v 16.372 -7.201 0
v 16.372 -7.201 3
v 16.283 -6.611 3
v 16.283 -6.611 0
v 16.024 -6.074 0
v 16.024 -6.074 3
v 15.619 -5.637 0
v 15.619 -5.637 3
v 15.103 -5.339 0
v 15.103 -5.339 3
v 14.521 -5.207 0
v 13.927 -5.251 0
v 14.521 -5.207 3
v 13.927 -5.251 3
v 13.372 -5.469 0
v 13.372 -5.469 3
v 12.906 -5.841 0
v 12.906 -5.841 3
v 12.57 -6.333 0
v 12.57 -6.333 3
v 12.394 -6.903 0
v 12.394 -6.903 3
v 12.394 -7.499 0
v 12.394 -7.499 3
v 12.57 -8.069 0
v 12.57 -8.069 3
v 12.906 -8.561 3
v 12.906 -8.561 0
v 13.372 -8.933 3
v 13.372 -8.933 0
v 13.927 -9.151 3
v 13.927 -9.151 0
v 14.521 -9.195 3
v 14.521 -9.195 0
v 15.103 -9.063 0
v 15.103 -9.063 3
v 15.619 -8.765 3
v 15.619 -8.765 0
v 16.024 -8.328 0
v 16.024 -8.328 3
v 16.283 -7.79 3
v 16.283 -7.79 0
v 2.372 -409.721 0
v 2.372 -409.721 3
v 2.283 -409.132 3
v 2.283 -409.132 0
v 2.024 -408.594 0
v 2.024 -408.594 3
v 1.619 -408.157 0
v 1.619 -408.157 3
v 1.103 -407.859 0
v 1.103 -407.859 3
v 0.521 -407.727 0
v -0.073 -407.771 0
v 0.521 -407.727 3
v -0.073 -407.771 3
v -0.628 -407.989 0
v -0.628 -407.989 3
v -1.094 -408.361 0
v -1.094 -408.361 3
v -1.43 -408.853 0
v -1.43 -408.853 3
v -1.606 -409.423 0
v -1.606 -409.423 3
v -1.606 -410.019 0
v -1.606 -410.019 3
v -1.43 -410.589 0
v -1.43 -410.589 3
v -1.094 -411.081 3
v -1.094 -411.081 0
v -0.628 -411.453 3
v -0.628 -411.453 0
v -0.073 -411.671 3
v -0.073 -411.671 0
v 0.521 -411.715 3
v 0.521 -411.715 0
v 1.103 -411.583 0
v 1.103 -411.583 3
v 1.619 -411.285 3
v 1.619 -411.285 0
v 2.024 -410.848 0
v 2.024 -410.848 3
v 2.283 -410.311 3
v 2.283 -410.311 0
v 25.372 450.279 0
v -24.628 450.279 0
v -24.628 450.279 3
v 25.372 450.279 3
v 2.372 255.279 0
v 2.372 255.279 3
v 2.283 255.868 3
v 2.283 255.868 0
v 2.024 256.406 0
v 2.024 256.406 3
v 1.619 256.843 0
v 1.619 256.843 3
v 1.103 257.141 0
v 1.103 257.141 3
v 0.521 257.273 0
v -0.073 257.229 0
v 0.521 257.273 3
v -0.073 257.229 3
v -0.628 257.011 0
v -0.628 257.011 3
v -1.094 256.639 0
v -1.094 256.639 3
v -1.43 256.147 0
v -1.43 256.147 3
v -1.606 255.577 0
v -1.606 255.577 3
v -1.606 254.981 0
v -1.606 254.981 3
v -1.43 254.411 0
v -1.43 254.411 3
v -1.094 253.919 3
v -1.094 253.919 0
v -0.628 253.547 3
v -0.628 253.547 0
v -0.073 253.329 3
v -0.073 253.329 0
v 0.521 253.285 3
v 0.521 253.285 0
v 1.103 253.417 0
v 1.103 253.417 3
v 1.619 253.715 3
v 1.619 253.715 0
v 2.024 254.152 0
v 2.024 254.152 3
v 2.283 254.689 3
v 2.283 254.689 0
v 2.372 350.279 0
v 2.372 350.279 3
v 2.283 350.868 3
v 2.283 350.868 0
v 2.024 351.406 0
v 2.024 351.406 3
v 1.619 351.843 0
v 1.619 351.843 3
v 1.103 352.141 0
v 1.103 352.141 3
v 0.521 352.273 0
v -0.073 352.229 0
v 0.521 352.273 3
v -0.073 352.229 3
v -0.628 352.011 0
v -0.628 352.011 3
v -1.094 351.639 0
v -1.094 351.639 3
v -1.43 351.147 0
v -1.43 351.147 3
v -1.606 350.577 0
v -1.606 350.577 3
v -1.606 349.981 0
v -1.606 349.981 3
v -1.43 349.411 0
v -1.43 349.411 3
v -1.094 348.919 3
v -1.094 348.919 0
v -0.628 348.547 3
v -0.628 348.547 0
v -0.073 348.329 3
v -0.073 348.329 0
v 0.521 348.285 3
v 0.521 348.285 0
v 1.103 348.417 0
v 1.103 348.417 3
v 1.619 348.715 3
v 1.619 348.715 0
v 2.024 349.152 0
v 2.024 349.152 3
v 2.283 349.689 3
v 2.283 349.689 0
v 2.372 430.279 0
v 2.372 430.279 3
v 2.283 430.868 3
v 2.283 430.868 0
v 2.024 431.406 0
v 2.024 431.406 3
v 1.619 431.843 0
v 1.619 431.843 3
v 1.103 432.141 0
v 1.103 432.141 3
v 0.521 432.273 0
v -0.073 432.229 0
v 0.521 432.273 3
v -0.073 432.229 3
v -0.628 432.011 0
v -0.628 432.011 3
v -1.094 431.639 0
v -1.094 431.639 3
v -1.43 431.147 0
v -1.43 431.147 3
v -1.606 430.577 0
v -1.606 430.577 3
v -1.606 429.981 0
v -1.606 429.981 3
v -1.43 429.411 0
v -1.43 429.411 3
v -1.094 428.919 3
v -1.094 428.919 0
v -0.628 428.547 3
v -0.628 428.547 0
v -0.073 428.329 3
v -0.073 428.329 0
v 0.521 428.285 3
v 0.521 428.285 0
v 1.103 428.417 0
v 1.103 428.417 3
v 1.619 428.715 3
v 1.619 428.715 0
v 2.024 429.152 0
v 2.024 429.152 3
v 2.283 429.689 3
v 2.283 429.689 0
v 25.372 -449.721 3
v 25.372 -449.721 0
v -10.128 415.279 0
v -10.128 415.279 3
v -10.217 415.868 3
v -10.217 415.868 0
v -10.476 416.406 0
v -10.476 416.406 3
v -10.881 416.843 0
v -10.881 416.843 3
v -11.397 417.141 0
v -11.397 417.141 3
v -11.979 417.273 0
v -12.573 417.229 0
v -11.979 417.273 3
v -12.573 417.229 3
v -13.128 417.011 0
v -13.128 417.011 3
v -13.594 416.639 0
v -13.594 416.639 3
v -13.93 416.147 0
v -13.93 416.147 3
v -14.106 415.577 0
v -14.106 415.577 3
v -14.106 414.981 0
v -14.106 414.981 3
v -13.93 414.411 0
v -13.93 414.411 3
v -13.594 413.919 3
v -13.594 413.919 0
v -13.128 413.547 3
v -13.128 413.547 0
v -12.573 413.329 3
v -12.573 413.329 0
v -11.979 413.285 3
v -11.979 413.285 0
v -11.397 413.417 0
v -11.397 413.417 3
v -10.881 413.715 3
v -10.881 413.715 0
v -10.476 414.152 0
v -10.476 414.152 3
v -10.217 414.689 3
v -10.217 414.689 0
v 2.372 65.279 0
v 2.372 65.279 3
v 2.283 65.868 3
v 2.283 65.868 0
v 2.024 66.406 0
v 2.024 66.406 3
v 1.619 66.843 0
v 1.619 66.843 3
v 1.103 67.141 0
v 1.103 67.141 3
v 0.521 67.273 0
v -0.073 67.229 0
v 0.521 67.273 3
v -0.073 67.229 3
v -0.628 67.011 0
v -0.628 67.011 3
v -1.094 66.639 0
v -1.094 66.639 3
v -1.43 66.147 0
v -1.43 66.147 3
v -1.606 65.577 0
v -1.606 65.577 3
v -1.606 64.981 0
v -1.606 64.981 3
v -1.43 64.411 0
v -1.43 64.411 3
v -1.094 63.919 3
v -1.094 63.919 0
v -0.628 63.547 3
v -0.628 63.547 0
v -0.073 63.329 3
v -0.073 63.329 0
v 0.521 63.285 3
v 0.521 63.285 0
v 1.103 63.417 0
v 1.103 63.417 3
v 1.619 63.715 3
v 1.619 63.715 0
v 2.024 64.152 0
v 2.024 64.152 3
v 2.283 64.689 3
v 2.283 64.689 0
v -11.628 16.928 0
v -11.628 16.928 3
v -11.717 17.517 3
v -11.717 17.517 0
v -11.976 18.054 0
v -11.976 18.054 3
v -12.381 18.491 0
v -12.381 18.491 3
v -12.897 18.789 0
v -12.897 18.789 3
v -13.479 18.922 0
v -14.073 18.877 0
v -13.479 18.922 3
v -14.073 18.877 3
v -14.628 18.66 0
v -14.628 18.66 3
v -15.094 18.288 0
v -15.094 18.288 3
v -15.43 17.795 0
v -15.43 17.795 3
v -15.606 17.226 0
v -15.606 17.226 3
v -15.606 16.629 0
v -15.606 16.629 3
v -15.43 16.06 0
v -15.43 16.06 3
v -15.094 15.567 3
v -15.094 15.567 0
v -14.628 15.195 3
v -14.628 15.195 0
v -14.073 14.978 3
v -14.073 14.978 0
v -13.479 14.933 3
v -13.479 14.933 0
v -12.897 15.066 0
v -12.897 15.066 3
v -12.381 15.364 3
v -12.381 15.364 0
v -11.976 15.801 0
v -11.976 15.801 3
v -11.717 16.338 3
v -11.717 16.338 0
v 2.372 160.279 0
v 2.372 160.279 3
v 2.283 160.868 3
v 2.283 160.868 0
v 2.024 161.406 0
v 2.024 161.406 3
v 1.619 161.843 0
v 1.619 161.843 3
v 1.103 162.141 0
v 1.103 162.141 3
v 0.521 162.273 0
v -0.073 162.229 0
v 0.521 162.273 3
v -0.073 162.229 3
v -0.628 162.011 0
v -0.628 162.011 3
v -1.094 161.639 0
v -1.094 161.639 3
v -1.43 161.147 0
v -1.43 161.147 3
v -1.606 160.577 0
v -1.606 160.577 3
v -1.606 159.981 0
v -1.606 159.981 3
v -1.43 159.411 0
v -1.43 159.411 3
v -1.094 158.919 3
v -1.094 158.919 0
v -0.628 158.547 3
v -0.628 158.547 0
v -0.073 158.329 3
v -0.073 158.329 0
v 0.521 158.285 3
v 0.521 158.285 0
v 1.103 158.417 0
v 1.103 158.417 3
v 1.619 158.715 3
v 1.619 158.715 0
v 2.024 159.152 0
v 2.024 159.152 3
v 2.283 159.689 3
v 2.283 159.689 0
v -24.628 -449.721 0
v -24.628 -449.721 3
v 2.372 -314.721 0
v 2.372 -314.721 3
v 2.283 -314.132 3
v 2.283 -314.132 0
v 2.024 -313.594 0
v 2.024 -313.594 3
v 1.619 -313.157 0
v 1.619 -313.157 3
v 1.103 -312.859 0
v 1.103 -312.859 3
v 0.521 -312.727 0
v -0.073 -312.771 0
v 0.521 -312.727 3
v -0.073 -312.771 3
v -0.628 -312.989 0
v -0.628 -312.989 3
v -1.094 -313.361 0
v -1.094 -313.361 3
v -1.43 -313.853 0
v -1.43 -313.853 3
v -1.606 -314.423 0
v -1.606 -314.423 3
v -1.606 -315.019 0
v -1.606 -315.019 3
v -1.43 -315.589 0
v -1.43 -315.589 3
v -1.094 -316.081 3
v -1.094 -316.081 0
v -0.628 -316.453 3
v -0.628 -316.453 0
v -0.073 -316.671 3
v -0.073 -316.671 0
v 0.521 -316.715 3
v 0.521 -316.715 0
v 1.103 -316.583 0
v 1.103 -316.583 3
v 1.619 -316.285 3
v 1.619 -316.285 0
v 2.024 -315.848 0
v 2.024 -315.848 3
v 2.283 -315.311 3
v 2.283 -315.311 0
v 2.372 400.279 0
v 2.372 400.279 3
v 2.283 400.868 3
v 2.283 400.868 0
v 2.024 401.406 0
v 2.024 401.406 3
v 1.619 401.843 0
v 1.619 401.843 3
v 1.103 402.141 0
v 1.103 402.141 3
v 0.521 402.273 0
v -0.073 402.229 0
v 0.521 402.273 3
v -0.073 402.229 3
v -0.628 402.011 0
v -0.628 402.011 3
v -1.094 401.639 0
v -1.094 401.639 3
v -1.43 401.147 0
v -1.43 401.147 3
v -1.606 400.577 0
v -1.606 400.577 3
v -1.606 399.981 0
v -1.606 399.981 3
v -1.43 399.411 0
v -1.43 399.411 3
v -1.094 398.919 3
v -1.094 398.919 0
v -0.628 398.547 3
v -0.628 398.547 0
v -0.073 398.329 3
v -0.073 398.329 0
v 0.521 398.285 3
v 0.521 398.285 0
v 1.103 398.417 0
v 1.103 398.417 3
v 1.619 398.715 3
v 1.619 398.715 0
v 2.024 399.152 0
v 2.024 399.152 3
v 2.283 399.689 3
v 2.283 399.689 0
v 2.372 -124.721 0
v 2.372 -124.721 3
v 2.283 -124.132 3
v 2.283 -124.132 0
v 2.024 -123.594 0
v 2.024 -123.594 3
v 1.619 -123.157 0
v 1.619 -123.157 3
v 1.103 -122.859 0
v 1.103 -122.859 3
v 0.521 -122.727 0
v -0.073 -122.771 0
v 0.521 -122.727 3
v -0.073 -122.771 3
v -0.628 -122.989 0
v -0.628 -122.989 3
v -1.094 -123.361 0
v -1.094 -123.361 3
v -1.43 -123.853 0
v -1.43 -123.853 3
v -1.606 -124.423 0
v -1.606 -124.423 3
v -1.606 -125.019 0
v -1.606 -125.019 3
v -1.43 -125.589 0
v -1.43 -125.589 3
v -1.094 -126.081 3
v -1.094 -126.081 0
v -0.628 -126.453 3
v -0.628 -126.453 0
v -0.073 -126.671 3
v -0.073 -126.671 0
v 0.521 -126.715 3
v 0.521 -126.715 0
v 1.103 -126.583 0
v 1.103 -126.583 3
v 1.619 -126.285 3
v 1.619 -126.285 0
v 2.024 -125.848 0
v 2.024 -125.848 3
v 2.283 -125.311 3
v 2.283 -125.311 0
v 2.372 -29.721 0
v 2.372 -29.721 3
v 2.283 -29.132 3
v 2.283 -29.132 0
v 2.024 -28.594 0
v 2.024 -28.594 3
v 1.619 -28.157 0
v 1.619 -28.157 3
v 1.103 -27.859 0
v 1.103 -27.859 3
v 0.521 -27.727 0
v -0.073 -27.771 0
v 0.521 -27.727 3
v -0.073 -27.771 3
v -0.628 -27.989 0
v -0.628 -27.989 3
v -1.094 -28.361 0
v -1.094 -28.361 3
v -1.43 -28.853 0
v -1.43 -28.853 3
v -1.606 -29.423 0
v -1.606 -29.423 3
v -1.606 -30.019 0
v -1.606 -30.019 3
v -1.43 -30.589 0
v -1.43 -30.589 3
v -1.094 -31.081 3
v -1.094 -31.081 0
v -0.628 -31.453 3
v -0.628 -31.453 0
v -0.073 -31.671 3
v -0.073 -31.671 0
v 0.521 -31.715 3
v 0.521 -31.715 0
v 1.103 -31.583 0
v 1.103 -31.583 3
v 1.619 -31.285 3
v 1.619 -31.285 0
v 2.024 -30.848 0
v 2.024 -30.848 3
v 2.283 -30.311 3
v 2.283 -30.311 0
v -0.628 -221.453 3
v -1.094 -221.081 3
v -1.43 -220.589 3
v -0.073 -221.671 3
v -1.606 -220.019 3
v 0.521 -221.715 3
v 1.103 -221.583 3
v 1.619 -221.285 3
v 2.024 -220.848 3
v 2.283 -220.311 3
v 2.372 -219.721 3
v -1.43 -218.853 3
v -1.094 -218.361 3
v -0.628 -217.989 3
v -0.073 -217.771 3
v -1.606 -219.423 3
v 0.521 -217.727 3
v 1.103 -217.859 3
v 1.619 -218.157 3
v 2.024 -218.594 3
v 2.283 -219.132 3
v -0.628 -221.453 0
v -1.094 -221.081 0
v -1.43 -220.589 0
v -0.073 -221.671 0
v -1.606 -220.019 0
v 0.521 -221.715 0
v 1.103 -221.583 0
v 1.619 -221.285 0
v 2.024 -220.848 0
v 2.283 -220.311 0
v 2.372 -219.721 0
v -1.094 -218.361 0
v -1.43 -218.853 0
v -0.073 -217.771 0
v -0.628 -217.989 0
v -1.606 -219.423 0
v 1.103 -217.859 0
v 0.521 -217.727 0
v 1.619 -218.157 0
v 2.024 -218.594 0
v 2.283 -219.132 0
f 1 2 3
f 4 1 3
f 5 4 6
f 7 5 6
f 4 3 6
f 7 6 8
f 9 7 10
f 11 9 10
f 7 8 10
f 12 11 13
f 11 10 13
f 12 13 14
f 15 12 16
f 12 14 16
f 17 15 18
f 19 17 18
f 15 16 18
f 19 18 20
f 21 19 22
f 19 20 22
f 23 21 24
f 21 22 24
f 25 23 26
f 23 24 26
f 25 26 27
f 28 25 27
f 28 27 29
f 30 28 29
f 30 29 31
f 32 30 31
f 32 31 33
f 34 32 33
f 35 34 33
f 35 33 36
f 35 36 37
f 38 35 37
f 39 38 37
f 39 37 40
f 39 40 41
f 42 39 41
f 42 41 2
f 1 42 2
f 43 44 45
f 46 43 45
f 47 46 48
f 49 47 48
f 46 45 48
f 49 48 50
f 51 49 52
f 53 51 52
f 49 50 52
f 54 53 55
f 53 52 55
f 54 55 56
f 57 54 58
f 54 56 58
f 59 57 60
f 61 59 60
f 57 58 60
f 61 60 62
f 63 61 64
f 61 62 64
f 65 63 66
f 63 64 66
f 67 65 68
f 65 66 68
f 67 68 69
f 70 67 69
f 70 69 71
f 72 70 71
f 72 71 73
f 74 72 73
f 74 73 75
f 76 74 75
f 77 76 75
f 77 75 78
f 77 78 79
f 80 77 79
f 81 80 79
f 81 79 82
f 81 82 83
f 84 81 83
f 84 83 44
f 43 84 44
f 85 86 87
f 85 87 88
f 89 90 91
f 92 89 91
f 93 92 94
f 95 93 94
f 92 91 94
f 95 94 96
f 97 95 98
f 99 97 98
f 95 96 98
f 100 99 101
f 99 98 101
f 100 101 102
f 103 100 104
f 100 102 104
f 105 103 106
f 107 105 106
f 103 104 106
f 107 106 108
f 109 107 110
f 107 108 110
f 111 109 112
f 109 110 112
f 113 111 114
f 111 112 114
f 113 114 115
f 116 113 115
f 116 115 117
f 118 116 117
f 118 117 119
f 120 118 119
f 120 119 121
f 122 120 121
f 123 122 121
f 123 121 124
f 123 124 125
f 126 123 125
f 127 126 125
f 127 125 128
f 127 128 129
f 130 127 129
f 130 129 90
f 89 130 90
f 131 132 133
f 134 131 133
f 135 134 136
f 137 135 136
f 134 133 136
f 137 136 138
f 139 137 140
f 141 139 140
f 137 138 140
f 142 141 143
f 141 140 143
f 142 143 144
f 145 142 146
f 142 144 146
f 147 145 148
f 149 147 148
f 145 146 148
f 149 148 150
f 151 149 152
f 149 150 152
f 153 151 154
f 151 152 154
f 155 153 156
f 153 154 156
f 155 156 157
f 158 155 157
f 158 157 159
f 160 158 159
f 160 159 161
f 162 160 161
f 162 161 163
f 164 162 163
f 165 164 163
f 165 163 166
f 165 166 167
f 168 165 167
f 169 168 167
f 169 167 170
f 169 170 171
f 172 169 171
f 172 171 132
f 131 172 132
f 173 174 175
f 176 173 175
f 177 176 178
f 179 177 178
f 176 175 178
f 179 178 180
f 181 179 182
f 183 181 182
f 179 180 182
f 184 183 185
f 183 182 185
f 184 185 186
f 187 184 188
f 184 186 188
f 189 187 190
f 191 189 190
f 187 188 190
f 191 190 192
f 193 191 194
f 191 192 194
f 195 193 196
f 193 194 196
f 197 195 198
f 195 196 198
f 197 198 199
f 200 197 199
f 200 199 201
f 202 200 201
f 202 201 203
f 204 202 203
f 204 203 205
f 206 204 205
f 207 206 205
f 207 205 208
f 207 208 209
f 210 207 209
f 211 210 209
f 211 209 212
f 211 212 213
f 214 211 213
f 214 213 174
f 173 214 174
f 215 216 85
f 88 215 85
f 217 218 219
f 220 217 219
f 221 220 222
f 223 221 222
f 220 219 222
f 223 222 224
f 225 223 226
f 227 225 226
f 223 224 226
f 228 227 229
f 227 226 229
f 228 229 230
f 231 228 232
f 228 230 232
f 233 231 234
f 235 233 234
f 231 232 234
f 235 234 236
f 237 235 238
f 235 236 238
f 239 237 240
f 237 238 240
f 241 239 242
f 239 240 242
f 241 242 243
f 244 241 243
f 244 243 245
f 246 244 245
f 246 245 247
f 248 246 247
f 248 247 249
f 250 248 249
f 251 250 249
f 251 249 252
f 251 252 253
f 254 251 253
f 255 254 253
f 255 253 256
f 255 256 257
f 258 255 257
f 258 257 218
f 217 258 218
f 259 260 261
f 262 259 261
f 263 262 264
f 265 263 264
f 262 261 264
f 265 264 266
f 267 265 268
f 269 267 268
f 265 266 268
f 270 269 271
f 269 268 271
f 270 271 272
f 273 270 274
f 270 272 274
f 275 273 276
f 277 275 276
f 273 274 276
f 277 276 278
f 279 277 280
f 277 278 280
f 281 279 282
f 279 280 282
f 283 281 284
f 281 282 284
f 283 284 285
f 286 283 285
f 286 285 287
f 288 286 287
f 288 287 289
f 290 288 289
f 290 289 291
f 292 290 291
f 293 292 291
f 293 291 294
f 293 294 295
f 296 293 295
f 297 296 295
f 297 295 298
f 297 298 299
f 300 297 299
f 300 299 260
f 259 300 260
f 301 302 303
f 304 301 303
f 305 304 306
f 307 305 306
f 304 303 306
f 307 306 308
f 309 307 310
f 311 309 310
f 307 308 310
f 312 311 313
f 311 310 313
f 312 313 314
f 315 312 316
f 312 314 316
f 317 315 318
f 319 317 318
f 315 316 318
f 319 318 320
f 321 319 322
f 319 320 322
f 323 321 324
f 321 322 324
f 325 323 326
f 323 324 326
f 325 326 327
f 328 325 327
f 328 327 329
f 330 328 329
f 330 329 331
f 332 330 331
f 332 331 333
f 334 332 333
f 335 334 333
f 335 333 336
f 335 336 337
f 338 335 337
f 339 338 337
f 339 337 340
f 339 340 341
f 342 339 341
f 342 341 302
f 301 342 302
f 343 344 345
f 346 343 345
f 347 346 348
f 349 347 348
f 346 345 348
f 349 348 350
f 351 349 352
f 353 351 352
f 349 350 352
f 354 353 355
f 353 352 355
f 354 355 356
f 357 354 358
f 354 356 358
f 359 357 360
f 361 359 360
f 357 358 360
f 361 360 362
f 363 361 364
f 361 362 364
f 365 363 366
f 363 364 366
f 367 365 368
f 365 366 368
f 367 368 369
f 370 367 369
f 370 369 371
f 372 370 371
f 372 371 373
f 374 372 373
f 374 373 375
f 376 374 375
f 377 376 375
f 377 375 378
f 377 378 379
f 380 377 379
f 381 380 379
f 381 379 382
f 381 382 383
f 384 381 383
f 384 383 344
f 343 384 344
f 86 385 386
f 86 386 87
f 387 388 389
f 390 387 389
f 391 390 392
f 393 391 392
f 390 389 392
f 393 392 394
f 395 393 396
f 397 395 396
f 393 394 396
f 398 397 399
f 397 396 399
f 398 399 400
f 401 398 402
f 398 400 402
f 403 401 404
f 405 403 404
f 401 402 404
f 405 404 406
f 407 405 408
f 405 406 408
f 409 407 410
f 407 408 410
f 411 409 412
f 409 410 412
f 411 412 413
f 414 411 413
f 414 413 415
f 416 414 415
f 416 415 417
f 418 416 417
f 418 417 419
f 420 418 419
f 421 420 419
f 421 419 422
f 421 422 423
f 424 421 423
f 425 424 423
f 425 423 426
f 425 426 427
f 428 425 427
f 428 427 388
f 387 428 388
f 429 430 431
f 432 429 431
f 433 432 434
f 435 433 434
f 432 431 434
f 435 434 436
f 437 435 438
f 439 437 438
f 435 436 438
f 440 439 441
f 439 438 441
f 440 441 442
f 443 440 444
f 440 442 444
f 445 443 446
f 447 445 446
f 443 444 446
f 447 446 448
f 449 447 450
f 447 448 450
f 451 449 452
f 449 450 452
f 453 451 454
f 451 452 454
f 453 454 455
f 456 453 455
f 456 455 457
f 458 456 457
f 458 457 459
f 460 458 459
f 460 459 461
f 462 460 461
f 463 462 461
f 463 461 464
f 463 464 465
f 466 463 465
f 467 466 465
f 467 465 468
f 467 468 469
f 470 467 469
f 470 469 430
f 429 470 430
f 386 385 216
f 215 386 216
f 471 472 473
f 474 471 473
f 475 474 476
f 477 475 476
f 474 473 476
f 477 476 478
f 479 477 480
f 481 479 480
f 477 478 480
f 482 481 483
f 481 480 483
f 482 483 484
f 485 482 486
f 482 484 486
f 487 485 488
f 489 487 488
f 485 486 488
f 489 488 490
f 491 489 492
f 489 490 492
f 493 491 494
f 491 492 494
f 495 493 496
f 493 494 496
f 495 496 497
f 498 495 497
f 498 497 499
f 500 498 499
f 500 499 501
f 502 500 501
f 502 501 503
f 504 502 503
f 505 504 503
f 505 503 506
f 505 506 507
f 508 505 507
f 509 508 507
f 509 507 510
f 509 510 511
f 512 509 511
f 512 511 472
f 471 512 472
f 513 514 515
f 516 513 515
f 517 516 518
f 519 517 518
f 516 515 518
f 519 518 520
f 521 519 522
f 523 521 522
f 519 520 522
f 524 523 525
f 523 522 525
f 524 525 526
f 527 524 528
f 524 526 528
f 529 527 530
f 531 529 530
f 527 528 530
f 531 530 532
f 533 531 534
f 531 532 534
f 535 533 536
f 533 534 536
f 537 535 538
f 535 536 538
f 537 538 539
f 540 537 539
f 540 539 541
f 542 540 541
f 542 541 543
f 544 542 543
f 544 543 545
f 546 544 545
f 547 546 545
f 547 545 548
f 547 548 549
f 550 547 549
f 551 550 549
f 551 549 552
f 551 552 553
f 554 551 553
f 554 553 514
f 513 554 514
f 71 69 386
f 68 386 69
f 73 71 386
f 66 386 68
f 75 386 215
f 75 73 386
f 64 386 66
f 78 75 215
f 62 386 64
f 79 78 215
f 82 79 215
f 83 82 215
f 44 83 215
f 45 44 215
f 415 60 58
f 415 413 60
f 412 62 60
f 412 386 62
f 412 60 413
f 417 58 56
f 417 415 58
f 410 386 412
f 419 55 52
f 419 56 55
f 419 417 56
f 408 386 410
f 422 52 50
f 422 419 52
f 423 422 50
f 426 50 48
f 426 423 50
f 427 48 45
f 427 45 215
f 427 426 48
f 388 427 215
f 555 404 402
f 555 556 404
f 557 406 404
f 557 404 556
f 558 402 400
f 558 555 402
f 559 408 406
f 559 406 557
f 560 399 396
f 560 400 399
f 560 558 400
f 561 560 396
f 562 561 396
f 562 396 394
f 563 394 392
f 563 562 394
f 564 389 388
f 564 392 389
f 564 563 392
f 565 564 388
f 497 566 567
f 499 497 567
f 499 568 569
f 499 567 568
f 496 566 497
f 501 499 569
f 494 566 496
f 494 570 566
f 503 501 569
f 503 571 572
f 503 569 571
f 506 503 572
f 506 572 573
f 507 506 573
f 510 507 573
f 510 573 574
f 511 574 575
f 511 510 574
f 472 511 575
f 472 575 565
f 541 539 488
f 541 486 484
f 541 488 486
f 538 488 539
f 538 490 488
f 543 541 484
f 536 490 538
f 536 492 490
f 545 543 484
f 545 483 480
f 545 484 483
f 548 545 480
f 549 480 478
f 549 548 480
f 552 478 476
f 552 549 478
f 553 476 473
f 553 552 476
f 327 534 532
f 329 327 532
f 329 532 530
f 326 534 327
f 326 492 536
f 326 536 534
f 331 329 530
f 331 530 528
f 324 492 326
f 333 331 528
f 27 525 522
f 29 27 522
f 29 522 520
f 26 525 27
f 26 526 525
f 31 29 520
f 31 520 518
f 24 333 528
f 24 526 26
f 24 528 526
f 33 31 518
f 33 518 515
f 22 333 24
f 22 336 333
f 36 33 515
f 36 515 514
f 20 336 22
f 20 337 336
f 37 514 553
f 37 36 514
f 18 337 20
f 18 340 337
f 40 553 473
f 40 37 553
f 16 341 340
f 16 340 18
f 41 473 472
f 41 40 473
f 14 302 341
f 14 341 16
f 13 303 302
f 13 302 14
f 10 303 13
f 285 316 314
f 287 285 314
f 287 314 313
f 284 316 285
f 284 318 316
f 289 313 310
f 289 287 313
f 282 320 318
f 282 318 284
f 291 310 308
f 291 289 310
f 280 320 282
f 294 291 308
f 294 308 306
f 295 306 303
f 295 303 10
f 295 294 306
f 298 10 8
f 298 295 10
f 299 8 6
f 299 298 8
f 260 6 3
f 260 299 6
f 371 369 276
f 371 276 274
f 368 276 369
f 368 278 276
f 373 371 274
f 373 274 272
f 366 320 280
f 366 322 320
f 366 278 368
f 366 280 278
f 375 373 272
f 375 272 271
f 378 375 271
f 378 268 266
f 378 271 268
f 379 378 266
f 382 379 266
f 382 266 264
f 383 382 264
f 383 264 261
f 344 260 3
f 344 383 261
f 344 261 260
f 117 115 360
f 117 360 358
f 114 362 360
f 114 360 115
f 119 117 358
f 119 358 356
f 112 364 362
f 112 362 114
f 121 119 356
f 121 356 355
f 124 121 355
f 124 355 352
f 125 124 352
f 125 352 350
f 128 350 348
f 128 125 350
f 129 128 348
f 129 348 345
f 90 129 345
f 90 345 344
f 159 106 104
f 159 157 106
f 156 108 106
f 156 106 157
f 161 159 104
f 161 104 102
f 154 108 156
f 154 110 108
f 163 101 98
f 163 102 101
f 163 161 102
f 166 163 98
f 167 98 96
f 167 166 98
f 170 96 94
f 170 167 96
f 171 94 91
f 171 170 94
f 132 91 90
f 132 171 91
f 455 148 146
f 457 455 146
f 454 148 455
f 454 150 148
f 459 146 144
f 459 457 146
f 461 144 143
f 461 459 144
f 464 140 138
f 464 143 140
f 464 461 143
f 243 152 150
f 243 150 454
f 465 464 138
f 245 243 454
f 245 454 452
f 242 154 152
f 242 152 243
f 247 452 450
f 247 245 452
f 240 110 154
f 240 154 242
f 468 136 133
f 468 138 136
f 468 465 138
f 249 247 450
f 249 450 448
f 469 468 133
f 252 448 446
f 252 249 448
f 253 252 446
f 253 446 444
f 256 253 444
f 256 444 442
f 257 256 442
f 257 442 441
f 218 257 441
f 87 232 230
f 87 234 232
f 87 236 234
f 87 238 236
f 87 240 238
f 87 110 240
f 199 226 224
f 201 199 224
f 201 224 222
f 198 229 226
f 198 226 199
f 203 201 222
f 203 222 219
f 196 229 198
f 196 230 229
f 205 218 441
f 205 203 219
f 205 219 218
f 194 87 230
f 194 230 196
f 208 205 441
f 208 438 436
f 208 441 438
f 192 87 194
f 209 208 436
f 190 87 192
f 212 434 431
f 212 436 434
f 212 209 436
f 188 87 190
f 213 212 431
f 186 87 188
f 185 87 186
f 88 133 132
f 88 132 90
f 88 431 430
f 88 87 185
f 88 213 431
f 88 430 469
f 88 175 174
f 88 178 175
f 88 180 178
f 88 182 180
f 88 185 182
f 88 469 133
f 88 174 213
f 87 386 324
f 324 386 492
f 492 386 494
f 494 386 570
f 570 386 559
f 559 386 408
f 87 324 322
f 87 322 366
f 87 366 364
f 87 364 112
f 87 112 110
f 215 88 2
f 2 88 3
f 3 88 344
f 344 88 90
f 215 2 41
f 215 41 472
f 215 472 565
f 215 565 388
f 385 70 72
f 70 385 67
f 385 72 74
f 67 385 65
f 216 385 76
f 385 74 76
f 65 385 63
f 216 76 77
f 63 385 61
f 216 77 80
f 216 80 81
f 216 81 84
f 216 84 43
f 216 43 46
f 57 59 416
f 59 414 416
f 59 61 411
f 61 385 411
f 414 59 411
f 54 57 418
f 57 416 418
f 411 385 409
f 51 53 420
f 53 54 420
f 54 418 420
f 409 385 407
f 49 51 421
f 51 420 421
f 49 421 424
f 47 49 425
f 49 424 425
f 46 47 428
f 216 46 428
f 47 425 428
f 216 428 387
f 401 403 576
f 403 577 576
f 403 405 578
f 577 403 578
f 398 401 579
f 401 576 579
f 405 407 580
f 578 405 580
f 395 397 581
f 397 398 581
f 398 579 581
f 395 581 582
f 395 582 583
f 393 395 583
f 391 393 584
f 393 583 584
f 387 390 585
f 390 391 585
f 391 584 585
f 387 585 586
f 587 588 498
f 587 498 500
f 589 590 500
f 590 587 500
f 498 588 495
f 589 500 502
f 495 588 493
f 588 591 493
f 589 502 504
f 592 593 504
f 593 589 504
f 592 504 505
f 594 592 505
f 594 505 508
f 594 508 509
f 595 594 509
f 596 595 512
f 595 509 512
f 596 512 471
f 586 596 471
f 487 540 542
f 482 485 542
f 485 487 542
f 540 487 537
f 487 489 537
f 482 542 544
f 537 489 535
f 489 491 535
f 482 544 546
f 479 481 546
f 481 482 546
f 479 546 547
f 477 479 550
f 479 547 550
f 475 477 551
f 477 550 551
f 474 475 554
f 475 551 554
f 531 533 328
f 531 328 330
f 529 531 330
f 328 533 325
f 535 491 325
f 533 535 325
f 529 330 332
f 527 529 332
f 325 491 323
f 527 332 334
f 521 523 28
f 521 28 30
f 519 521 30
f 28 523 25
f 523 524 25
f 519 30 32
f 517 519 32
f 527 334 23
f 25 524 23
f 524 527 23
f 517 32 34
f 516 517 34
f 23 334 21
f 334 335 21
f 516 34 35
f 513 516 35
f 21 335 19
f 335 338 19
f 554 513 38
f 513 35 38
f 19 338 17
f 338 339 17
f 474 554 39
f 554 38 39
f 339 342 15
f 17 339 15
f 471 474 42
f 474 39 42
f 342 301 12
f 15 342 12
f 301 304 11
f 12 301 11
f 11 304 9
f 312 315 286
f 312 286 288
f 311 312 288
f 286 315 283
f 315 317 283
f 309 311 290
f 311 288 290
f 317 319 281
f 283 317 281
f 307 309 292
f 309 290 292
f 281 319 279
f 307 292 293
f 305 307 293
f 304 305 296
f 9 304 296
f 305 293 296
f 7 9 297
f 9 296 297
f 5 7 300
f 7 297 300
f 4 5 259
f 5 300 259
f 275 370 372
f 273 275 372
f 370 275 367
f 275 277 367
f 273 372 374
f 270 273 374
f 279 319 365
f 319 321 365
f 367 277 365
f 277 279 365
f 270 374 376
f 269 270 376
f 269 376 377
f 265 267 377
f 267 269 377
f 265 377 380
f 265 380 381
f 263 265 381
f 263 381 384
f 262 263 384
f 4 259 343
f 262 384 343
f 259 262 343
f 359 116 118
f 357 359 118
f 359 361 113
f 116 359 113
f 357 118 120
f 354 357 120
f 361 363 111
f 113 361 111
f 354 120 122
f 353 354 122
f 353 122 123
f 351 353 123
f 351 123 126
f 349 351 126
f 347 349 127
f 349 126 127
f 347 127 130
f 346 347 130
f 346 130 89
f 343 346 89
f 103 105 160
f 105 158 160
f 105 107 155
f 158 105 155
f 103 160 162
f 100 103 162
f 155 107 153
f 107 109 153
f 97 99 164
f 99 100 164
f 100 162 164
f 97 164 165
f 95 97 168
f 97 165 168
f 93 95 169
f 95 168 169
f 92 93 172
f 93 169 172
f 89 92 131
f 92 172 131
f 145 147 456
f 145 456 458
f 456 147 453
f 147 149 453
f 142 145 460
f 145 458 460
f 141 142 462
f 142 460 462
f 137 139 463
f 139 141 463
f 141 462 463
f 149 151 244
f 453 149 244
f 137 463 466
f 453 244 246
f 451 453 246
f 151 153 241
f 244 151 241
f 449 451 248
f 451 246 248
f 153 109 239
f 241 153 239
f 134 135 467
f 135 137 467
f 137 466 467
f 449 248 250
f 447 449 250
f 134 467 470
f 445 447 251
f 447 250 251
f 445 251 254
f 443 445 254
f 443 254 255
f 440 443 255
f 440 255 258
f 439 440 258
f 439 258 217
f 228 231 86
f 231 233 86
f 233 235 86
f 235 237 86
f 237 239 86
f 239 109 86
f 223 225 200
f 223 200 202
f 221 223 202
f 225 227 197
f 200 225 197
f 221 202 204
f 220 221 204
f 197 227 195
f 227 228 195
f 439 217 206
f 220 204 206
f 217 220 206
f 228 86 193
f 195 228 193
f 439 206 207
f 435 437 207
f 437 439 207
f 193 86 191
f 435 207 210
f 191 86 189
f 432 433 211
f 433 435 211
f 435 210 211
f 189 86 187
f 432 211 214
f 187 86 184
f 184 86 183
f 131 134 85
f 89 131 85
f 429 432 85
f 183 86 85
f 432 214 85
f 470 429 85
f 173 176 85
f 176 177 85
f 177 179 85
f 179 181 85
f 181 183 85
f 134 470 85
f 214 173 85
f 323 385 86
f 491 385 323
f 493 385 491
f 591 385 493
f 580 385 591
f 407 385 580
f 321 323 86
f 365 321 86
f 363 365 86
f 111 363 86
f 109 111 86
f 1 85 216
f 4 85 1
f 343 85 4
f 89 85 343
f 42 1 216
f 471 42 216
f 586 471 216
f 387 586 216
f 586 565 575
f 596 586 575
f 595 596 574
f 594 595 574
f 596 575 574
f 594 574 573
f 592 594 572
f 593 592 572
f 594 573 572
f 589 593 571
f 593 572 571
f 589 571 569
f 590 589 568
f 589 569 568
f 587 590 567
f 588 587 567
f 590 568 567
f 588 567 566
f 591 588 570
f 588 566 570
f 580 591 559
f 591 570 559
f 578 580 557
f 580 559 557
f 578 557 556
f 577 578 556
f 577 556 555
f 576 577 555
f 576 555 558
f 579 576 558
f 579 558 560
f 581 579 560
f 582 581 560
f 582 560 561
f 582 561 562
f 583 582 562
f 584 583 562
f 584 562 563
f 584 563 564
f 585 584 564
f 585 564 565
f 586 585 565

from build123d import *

# Parameters (mm, degrees)
SKETCH2_W           = 50
SKETCH2_H           = 900
BOSS_EXTRUDE1_DEPTH = 3
CUT_EXTRUDE1_REACH  = 5
SKETCH3_R           = 2


with BuildPart() as part:
    # Sketch2 → Boss-Extrude1 (new body)
    with BuildSketch(Plane.XY):
        with Locations((0.371961745, 0.278971309)):
            Rectangle(SKETCH2_W, SKETCH2_H)
    extrude(amount=BOSS_EXTRUDE1_DEPTH)

    # Sketch3 → Cut-Extrude1 (cut, up to next)
    with BuildSketch(Plane.XY.offset(3), mode=Mode.PRIVATE) as cut_extrude1_sk1:
        with Locations((0.371961745, 350.278971308)):
            Circle(SKETCH3_R)
    cut_extrude1_tool1 = extrude(cut_extrude1_sk1.sketch, amount=-CUT_EXTRUDE1_REACH, mode=Mode.PRIVATE) & part.part
    add(cut_extrude1_tool1.solids().sort_by_distance((0.371962, 350.278971, 3))[0], mode=Mode.SUBTRACT)
    # Sketch3 → Cut-Extrude1 (cut, up to next)
    with BuildSketch(Plane.XY.offset(3), mode=Mode.PRIVATE) as cut_extrude1_sk2:
        with Locations((0.371961745, 400.278971308)):
            Circle(SKETCH3_R)
    cut_extrude1_tool2 = extrude(cut_extrude1_sk2.sketch, amount=-CUT_EXTRUDE1_REACH, mode=Mode.PRIVATE) & part.part
    add(cut_extrude1_tool2.solids().sort_by_distance((0.371962, 400.278971, 3))[0], mode=Mode.SUBTRACT)
    # Sketch3 → Cut-Extrude1 (cut, up to next)
    with BuildSketch(Plane.XY.offset(3), mode=Mode.PRIVATE) as cut_extrude1_sk3:
        with Locations((0.371961745, 430.278971309)):
            Circle(SKETCH3_R)
    cut_extrude1_tool3 = extrude(cut_extrude1_sk3.sketch, amount=-CUT_EXTRUDE1_REACH, mode=Mode.PRIVATE) & part.part
    add(cut_extrude1_tool3.solids().sort_by_distance((0.371962, 430.278971, 3))[0], mode=Mode.SUBTRACT)
    # Sketch3 → Cut-Extrude1 (cut, up to next)
    with BuildSketch(Plane.XY.offset(3), mode=Mode.PRIVATE) as cut_extrude1_sk4:
        with Locations((-12.128038255, 415.278971308)):
            Circle(SKETCH3_R)
    cut_extrude1_tool4 = extrude(cut_extrude1_sk4.sketch, amount=-CUT_EXTRUDE1_REACH, mode=Mode.PRIVATE) & part.part
    add(cut_extrude1_tool4.solids().sort_by_distance((-12.128038, 415.278971, 3))[0], mode=Mode.SUBTRACT)
    # Sketch3 → Cut-Extrude1 (cut, up to next)
    with BuildSketch(Plane.XY.offset(3), mode=Mode.PRIVATE) as cut_extrude1_sk5:
        with Locations((0.371961745, 255.278971308)):
            Circle(SKETCH3_R)
    cut_extrude1_tool5 = extrude(cut_extrude1_sk5.sketch, amount=-CUT_EXTRUDE1_REACH, mode=Mode.PRIVATE) & part.part
    add(cut_extrude1_tool5.solids().sort_by_distance((0.371962, 255.278971, 3))[0], mode=Mode.SUBTRACT)
    # Sketch3 → Cut-Extrude1 (cut, up to next)
    with BuildSketch(Plane.XY.offset(3), mode=Mode.PRIVATE) as cut_extrude1_sk6:
        with Locations((0.371961745, 160.278971308)):
            Circle(SKETCH3_R)
    cut_extrude1_tool6 = extrude(cut_extrude1_sk6.sketch, amount=-CUT_EXTRUDE1_REACH, mode=Mode.PRIVATE) & part.part
    add(cut_extrude1_tool6.solids().sort_by_distance((0.371962, 160.278971, 3))[0], mode=Mode.SUBTRACT)
    # Sketch3 → Cut-Extrude1 (cut, up to next)
    with BuildSketch(Plane.XY.offset(3), mode=Mode.PRIVATE) as cut_extrude1_sk7:
        with Locations((0.371961745, 65.278971308)):
            Circle(SKETCH3_R)
    cut_extrude1_tool7 = extrude(cut_extrude1_sk7.sketch, amount=-CUT_EXTRUDE1_REACH, mode=Mode.PRIVATE) & part.part
    add(cut_extrude1_tool7.solids().sort_by_distance((0.371962, 65.278971, 3))[0], mode=Mode.SUBTRACT)
    # Sketch3 → Cut-Extrude1 (cut, up to next)
    with BuildSketch(Plane.XY.offset(3), mode=Mode.PRIVATE) as cut_extrude1_sk8:
        with Locations((0.371961745, -29.721028692)):
            Circle(SKETCH3_R)
    cut_extrude1_tool8 = extrude(cut_extrude1_sk8.sketch, amount=-CUT_EXTRUDE1_REACH, mode=Mode.PRIVATE) & part.part
    add(cut_extrude1_tool8.solids().sort_by_distance((0.371962, -29.721029, 3))[0], mode=Mode.SUBTRACT)
    # Sketch3 → Cut-Extrude1 (cut, up to next)
    with BuildSketch(Plane.XY.offset(3), mode=Mode.PRIVATE) as cut_extrude1_sk9:
        with Locations((0.371961745, -124.721028692)):
            Circle(SKETCH3_R)
    cut_extrude1_tool9 = extrude(cut_extrude1_sk9.sketch, amount=-CUT_EXTRUDE1_REACH, mode=Mode.PRIVATE) & part.part
    add(cut_extrude1_tool9.solids().sort_by_distance((0.371962, -124.721029, 3))[0], mode=Mode.SUBTRACT)
    # Sketch3 → Cut-Extrude1 (cut, up to next)
    with BuildSketch(Plane.XY.offset(3), mode=Mode.PRIVATE) as cut_extrude1_sk10:
        with Locations((0.371961745, -219.721028692)):
            Circle(SKETCH3_R)
    cut_extrude1_tool10 = extrude(cut_extrude1_sk10.sketch, amount=-CUT_EXTRUDE1_REACH, mode=Mode.PRIVATE) & part.part
    add(cut_extrude1_tool10.solids().sort_by_distance((0.371962, -219.721029, 3))[0], mode=Mode.SUBTRACT)
    # Sketch3 → Cut-Extrude1 (cut, up to next)
    with BuildSketch(Plane.XY.offset(3), mode=Mode.PRIVATE) as cut_extrude1_sk11:
        with Locations((0.371961745, -314.721028692)):
            Circle(SKETCH3_R)
    cut_extrude1_tool11 = extrude(cut_extrude1_sk11.sketch, amount=-CUT_EXTRUDE1_REACH, mode=Mode.PRIVATE) & part.part
    add(cut_extrude1_tool11.solids().sort_by_distance((0.371962, -314.721029, 3))[0], mode=Mode.SUBTRACT)
    # Sketch3 → Cut-Extrude1 (cut, up to next)
    with BuildSketch(Plane.XY.offset(3), mode=Mode.PRIVATE) as cut_extrude1_sk12:
        with Locations((0.371961745, -409.721028692)):
            Circle(SKETCH3_R)
    cut_extrude1_tool12 = extrude(cut_extrude1_sk12.sketch, amount=-CUT_EXTRUDE1_REACH, mode=Mode.PRIVATE) & part.part
    add(cut_extrude1_tool12.solids().sort_by_distance((0.371962, -409.721029, 3))[0], mode=Mode.SUBTRACT)
    # Sketch3 → Cut-Extrude1 (cut, up to next)
    with BuildSketch(Plane.XY.offset(3), mode=Mode.PRIVATE) as cut_extrude1_sk13:
        with Locations((14.371961745, -7.200910707)):
            Circle(SKETCH3_R)
    cut_extrude1_tool13 = extrude(cut_extrude1_sk13.sketch, amount=-CUT_EXTRUDE1_REACH, mode=Mode.PRIVATE) & part.part
    add(cut_extrude1_tool13.solids().sort_by_distance((14.371962, -7.200911, 3))[0], mode=Mode.SUBTRACT)
    # Sketch3 → Cut-Extrude1 (cut, up to next)
    with BuildSketch(Plane.XY.offset(3), mode=Mode.PRIVATE) as cut_extrude1_sk14:
        with Locations((-13.628038255, 16.927507875)):
            Circle(SKETCH3_R)
    cut_extrude1_tool14 = extrude(cut_extrude1_sk14.sketch, amount=-CUT_EXTRUDE1_REACH, mode=Mode.PRIVATE) & part.part
    add(cut_extrude1_tool14.solids().sort_by_distance((-13.628038, 16.927508, 3))[0], mode=Mode.SUBTRACT)


solid = part.part
